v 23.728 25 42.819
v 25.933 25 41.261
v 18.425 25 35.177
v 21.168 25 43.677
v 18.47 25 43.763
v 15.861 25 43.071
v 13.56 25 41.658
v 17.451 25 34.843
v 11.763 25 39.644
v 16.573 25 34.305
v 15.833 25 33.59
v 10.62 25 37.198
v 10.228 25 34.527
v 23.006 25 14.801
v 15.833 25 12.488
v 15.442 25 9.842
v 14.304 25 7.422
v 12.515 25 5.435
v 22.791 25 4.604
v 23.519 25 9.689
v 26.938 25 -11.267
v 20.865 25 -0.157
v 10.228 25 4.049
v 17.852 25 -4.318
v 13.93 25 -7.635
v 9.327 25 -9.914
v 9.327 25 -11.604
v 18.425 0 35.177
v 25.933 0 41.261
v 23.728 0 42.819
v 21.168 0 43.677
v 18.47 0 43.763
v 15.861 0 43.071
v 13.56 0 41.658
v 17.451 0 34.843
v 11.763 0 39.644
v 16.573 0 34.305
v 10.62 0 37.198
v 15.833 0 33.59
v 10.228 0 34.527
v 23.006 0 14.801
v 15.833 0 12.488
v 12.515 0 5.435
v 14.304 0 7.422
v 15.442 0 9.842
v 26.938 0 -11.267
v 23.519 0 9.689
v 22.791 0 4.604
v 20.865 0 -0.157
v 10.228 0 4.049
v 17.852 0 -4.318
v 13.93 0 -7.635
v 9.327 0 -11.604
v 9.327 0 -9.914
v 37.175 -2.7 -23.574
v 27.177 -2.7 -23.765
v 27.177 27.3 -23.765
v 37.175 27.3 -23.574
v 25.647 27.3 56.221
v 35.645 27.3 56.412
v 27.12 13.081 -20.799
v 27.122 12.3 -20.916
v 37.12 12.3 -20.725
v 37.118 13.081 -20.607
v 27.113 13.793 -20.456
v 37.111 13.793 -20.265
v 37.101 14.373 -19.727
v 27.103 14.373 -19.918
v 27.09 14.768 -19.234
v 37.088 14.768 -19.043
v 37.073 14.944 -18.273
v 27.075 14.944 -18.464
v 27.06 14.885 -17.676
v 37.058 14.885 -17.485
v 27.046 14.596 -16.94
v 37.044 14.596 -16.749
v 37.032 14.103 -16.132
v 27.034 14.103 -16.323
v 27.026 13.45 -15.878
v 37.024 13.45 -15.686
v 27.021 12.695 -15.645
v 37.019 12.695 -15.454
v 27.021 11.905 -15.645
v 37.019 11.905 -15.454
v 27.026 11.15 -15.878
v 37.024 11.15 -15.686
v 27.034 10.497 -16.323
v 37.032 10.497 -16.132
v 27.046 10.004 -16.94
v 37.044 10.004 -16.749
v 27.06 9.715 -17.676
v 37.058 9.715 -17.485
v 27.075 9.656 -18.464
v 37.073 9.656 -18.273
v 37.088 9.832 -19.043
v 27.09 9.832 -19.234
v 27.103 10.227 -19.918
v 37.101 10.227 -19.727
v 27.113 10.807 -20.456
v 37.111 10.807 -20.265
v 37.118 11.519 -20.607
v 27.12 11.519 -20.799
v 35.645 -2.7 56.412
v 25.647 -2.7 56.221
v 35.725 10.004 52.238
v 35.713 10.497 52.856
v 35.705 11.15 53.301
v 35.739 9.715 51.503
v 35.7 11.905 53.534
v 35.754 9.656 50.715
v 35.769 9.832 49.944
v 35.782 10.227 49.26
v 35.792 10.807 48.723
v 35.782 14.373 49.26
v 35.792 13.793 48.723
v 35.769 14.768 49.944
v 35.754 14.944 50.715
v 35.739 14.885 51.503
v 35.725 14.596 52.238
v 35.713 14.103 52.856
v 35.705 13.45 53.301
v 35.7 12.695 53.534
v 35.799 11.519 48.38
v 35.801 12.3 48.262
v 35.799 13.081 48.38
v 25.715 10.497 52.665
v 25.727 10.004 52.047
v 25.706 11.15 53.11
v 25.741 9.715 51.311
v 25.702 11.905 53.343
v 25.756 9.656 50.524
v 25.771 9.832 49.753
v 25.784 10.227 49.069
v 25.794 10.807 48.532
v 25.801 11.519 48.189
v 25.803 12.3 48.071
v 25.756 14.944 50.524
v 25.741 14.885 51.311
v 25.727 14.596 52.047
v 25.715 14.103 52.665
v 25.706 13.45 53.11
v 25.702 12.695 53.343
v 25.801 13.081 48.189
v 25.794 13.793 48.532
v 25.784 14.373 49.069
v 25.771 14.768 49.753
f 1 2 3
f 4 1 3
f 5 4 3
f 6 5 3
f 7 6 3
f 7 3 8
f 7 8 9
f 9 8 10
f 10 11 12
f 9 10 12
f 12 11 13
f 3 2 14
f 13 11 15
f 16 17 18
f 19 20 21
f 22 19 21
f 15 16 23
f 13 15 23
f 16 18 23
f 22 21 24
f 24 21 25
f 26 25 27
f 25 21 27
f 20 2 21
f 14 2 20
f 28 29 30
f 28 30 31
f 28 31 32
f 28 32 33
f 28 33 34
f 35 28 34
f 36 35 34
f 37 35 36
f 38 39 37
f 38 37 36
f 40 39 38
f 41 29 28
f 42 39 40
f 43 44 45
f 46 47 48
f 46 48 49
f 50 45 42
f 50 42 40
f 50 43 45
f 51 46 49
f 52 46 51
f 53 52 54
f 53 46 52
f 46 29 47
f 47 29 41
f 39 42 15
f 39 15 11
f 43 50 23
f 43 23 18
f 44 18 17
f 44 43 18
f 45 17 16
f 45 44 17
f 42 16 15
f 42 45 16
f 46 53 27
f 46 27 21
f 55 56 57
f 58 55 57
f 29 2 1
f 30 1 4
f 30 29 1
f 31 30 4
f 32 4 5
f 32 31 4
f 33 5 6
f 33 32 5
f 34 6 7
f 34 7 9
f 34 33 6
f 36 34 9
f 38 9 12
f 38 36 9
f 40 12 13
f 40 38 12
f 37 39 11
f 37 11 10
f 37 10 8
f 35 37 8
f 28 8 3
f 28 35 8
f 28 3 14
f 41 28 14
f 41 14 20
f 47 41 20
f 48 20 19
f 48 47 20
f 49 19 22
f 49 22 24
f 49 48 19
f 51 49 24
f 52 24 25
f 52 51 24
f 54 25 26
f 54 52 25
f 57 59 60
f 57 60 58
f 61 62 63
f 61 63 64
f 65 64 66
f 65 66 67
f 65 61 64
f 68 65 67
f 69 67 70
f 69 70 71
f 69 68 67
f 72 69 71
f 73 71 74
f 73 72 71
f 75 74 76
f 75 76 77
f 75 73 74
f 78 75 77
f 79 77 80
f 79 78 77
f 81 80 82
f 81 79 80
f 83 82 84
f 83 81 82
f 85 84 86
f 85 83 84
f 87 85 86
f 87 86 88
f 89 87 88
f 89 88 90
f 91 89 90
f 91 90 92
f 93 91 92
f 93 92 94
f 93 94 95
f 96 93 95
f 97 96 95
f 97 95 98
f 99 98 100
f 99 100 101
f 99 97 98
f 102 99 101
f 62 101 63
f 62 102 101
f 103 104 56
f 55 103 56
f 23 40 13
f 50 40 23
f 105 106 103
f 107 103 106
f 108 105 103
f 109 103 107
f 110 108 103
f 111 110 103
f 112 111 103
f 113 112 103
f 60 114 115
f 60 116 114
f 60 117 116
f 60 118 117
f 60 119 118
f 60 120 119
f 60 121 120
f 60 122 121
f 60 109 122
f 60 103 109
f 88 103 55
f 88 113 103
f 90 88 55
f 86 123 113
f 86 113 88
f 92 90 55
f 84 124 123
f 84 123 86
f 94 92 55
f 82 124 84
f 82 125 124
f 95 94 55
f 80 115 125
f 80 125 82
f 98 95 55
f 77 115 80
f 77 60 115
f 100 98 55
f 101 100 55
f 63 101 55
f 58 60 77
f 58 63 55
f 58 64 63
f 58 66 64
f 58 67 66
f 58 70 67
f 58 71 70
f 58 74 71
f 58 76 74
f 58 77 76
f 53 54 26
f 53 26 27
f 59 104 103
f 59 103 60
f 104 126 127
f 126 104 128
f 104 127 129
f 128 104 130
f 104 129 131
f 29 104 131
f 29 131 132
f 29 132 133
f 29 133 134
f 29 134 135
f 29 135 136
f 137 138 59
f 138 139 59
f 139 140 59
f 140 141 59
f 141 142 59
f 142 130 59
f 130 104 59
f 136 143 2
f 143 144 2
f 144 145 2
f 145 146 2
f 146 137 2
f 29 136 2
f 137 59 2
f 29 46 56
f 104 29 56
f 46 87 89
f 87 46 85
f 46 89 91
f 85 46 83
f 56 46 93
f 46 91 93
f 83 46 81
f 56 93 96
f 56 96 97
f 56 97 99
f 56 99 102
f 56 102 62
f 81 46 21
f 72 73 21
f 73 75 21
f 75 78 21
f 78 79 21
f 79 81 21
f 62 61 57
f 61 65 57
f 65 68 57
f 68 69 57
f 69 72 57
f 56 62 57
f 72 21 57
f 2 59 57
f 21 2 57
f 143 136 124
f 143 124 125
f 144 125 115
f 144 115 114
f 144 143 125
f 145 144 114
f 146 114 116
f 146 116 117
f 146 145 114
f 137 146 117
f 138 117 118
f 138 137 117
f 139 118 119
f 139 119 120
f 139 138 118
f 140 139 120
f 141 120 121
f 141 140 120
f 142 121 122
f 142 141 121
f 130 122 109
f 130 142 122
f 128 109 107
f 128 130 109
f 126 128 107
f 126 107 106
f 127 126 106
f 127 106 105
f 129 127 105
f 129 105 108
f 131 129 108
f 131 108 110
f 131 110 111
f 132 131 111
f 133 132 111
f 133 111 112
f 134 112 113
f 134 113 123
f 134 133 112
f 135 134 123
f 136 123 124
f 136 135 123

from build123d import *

# Parameters (mm, degrees)
BOSS_EXTRUDE1_DEPTH = 25
SKETCH4_W           = 80
SKETCH4_H           = 30
SKETCH4_R           = 2.651056997
BOSS_EXTRUDE4_DEPTH = 10


with BuildPart() as part:
    # Sketch1 → Boss-Extrude1 (new body)
    with BuildSketch(Plane(origin=(0, 0, 0), x_dir=(1, 0, 0), z_dir=(0, 1, 0))):
        with BuildLine():
            Line((18.424541272, -35.177357689), (23.005994318, -14.800530945))
            ThreePointArc((23.005994318, -14.800530945), (20.864784183, 0.157407238), (9.326512498, 9.914096331))
            Line((9.326512498, 9.914096331), (9.326512498, 11.603851187))
            Line((9.326512498, 11.603851187), (26.937532501, 11.267061467))
            Line((26.937532501, 11.267061467), (25.932986747, -41.261487659))
            ThreePointArc((25.932986747, -41.261487659), (15.860542773, -43.070975474), (10.227869895, -34.526891555))
            Line((10.227869895, -34.526891555), (10.227869895, -4.048540158))
            ThreePointArc((10.227869895, -4.048540158), (14.304101202, -7.422369294), (15.833057178, -12.488006305))
            Line((15.833057178, -12.488006305), (15.833057178, -33.589930418))
            ThreePointArc((15.833057178, -33.589930418), (16.997270485, -34.598365473), (18.424541272, -35.177357689))
        make_face()
    extrude(amount=BOSS_EXTRUDE1_DEPTH)

    # Sketch4 → Boss-Extrude4 (add)
    with BuildSketch(Plane(origin=(26.712294191, 0, 0.510840717), x_dir=(0.0191203094367821, 0, -0.9998171901738045), z_dir=(0.9998171901738045, 0, 0.0191203094367821))):
        with Locations((-15.719944306, 12.3)):
            Rectangle(SKETCH4_W, SKETCH4_H)
        with Locations((-50.219944306, 12.3)):
            Circle(SKETCH4_R, mode=Mode.SUBTRACT)
        with Locations((18.780055694, 12.3)):
            Circle(SKETCH4_R, mode=Mode.SUBTRACT)
    extrude(amount=BOSS_EXTRUDE4_DEPTH)


solid = part.part
